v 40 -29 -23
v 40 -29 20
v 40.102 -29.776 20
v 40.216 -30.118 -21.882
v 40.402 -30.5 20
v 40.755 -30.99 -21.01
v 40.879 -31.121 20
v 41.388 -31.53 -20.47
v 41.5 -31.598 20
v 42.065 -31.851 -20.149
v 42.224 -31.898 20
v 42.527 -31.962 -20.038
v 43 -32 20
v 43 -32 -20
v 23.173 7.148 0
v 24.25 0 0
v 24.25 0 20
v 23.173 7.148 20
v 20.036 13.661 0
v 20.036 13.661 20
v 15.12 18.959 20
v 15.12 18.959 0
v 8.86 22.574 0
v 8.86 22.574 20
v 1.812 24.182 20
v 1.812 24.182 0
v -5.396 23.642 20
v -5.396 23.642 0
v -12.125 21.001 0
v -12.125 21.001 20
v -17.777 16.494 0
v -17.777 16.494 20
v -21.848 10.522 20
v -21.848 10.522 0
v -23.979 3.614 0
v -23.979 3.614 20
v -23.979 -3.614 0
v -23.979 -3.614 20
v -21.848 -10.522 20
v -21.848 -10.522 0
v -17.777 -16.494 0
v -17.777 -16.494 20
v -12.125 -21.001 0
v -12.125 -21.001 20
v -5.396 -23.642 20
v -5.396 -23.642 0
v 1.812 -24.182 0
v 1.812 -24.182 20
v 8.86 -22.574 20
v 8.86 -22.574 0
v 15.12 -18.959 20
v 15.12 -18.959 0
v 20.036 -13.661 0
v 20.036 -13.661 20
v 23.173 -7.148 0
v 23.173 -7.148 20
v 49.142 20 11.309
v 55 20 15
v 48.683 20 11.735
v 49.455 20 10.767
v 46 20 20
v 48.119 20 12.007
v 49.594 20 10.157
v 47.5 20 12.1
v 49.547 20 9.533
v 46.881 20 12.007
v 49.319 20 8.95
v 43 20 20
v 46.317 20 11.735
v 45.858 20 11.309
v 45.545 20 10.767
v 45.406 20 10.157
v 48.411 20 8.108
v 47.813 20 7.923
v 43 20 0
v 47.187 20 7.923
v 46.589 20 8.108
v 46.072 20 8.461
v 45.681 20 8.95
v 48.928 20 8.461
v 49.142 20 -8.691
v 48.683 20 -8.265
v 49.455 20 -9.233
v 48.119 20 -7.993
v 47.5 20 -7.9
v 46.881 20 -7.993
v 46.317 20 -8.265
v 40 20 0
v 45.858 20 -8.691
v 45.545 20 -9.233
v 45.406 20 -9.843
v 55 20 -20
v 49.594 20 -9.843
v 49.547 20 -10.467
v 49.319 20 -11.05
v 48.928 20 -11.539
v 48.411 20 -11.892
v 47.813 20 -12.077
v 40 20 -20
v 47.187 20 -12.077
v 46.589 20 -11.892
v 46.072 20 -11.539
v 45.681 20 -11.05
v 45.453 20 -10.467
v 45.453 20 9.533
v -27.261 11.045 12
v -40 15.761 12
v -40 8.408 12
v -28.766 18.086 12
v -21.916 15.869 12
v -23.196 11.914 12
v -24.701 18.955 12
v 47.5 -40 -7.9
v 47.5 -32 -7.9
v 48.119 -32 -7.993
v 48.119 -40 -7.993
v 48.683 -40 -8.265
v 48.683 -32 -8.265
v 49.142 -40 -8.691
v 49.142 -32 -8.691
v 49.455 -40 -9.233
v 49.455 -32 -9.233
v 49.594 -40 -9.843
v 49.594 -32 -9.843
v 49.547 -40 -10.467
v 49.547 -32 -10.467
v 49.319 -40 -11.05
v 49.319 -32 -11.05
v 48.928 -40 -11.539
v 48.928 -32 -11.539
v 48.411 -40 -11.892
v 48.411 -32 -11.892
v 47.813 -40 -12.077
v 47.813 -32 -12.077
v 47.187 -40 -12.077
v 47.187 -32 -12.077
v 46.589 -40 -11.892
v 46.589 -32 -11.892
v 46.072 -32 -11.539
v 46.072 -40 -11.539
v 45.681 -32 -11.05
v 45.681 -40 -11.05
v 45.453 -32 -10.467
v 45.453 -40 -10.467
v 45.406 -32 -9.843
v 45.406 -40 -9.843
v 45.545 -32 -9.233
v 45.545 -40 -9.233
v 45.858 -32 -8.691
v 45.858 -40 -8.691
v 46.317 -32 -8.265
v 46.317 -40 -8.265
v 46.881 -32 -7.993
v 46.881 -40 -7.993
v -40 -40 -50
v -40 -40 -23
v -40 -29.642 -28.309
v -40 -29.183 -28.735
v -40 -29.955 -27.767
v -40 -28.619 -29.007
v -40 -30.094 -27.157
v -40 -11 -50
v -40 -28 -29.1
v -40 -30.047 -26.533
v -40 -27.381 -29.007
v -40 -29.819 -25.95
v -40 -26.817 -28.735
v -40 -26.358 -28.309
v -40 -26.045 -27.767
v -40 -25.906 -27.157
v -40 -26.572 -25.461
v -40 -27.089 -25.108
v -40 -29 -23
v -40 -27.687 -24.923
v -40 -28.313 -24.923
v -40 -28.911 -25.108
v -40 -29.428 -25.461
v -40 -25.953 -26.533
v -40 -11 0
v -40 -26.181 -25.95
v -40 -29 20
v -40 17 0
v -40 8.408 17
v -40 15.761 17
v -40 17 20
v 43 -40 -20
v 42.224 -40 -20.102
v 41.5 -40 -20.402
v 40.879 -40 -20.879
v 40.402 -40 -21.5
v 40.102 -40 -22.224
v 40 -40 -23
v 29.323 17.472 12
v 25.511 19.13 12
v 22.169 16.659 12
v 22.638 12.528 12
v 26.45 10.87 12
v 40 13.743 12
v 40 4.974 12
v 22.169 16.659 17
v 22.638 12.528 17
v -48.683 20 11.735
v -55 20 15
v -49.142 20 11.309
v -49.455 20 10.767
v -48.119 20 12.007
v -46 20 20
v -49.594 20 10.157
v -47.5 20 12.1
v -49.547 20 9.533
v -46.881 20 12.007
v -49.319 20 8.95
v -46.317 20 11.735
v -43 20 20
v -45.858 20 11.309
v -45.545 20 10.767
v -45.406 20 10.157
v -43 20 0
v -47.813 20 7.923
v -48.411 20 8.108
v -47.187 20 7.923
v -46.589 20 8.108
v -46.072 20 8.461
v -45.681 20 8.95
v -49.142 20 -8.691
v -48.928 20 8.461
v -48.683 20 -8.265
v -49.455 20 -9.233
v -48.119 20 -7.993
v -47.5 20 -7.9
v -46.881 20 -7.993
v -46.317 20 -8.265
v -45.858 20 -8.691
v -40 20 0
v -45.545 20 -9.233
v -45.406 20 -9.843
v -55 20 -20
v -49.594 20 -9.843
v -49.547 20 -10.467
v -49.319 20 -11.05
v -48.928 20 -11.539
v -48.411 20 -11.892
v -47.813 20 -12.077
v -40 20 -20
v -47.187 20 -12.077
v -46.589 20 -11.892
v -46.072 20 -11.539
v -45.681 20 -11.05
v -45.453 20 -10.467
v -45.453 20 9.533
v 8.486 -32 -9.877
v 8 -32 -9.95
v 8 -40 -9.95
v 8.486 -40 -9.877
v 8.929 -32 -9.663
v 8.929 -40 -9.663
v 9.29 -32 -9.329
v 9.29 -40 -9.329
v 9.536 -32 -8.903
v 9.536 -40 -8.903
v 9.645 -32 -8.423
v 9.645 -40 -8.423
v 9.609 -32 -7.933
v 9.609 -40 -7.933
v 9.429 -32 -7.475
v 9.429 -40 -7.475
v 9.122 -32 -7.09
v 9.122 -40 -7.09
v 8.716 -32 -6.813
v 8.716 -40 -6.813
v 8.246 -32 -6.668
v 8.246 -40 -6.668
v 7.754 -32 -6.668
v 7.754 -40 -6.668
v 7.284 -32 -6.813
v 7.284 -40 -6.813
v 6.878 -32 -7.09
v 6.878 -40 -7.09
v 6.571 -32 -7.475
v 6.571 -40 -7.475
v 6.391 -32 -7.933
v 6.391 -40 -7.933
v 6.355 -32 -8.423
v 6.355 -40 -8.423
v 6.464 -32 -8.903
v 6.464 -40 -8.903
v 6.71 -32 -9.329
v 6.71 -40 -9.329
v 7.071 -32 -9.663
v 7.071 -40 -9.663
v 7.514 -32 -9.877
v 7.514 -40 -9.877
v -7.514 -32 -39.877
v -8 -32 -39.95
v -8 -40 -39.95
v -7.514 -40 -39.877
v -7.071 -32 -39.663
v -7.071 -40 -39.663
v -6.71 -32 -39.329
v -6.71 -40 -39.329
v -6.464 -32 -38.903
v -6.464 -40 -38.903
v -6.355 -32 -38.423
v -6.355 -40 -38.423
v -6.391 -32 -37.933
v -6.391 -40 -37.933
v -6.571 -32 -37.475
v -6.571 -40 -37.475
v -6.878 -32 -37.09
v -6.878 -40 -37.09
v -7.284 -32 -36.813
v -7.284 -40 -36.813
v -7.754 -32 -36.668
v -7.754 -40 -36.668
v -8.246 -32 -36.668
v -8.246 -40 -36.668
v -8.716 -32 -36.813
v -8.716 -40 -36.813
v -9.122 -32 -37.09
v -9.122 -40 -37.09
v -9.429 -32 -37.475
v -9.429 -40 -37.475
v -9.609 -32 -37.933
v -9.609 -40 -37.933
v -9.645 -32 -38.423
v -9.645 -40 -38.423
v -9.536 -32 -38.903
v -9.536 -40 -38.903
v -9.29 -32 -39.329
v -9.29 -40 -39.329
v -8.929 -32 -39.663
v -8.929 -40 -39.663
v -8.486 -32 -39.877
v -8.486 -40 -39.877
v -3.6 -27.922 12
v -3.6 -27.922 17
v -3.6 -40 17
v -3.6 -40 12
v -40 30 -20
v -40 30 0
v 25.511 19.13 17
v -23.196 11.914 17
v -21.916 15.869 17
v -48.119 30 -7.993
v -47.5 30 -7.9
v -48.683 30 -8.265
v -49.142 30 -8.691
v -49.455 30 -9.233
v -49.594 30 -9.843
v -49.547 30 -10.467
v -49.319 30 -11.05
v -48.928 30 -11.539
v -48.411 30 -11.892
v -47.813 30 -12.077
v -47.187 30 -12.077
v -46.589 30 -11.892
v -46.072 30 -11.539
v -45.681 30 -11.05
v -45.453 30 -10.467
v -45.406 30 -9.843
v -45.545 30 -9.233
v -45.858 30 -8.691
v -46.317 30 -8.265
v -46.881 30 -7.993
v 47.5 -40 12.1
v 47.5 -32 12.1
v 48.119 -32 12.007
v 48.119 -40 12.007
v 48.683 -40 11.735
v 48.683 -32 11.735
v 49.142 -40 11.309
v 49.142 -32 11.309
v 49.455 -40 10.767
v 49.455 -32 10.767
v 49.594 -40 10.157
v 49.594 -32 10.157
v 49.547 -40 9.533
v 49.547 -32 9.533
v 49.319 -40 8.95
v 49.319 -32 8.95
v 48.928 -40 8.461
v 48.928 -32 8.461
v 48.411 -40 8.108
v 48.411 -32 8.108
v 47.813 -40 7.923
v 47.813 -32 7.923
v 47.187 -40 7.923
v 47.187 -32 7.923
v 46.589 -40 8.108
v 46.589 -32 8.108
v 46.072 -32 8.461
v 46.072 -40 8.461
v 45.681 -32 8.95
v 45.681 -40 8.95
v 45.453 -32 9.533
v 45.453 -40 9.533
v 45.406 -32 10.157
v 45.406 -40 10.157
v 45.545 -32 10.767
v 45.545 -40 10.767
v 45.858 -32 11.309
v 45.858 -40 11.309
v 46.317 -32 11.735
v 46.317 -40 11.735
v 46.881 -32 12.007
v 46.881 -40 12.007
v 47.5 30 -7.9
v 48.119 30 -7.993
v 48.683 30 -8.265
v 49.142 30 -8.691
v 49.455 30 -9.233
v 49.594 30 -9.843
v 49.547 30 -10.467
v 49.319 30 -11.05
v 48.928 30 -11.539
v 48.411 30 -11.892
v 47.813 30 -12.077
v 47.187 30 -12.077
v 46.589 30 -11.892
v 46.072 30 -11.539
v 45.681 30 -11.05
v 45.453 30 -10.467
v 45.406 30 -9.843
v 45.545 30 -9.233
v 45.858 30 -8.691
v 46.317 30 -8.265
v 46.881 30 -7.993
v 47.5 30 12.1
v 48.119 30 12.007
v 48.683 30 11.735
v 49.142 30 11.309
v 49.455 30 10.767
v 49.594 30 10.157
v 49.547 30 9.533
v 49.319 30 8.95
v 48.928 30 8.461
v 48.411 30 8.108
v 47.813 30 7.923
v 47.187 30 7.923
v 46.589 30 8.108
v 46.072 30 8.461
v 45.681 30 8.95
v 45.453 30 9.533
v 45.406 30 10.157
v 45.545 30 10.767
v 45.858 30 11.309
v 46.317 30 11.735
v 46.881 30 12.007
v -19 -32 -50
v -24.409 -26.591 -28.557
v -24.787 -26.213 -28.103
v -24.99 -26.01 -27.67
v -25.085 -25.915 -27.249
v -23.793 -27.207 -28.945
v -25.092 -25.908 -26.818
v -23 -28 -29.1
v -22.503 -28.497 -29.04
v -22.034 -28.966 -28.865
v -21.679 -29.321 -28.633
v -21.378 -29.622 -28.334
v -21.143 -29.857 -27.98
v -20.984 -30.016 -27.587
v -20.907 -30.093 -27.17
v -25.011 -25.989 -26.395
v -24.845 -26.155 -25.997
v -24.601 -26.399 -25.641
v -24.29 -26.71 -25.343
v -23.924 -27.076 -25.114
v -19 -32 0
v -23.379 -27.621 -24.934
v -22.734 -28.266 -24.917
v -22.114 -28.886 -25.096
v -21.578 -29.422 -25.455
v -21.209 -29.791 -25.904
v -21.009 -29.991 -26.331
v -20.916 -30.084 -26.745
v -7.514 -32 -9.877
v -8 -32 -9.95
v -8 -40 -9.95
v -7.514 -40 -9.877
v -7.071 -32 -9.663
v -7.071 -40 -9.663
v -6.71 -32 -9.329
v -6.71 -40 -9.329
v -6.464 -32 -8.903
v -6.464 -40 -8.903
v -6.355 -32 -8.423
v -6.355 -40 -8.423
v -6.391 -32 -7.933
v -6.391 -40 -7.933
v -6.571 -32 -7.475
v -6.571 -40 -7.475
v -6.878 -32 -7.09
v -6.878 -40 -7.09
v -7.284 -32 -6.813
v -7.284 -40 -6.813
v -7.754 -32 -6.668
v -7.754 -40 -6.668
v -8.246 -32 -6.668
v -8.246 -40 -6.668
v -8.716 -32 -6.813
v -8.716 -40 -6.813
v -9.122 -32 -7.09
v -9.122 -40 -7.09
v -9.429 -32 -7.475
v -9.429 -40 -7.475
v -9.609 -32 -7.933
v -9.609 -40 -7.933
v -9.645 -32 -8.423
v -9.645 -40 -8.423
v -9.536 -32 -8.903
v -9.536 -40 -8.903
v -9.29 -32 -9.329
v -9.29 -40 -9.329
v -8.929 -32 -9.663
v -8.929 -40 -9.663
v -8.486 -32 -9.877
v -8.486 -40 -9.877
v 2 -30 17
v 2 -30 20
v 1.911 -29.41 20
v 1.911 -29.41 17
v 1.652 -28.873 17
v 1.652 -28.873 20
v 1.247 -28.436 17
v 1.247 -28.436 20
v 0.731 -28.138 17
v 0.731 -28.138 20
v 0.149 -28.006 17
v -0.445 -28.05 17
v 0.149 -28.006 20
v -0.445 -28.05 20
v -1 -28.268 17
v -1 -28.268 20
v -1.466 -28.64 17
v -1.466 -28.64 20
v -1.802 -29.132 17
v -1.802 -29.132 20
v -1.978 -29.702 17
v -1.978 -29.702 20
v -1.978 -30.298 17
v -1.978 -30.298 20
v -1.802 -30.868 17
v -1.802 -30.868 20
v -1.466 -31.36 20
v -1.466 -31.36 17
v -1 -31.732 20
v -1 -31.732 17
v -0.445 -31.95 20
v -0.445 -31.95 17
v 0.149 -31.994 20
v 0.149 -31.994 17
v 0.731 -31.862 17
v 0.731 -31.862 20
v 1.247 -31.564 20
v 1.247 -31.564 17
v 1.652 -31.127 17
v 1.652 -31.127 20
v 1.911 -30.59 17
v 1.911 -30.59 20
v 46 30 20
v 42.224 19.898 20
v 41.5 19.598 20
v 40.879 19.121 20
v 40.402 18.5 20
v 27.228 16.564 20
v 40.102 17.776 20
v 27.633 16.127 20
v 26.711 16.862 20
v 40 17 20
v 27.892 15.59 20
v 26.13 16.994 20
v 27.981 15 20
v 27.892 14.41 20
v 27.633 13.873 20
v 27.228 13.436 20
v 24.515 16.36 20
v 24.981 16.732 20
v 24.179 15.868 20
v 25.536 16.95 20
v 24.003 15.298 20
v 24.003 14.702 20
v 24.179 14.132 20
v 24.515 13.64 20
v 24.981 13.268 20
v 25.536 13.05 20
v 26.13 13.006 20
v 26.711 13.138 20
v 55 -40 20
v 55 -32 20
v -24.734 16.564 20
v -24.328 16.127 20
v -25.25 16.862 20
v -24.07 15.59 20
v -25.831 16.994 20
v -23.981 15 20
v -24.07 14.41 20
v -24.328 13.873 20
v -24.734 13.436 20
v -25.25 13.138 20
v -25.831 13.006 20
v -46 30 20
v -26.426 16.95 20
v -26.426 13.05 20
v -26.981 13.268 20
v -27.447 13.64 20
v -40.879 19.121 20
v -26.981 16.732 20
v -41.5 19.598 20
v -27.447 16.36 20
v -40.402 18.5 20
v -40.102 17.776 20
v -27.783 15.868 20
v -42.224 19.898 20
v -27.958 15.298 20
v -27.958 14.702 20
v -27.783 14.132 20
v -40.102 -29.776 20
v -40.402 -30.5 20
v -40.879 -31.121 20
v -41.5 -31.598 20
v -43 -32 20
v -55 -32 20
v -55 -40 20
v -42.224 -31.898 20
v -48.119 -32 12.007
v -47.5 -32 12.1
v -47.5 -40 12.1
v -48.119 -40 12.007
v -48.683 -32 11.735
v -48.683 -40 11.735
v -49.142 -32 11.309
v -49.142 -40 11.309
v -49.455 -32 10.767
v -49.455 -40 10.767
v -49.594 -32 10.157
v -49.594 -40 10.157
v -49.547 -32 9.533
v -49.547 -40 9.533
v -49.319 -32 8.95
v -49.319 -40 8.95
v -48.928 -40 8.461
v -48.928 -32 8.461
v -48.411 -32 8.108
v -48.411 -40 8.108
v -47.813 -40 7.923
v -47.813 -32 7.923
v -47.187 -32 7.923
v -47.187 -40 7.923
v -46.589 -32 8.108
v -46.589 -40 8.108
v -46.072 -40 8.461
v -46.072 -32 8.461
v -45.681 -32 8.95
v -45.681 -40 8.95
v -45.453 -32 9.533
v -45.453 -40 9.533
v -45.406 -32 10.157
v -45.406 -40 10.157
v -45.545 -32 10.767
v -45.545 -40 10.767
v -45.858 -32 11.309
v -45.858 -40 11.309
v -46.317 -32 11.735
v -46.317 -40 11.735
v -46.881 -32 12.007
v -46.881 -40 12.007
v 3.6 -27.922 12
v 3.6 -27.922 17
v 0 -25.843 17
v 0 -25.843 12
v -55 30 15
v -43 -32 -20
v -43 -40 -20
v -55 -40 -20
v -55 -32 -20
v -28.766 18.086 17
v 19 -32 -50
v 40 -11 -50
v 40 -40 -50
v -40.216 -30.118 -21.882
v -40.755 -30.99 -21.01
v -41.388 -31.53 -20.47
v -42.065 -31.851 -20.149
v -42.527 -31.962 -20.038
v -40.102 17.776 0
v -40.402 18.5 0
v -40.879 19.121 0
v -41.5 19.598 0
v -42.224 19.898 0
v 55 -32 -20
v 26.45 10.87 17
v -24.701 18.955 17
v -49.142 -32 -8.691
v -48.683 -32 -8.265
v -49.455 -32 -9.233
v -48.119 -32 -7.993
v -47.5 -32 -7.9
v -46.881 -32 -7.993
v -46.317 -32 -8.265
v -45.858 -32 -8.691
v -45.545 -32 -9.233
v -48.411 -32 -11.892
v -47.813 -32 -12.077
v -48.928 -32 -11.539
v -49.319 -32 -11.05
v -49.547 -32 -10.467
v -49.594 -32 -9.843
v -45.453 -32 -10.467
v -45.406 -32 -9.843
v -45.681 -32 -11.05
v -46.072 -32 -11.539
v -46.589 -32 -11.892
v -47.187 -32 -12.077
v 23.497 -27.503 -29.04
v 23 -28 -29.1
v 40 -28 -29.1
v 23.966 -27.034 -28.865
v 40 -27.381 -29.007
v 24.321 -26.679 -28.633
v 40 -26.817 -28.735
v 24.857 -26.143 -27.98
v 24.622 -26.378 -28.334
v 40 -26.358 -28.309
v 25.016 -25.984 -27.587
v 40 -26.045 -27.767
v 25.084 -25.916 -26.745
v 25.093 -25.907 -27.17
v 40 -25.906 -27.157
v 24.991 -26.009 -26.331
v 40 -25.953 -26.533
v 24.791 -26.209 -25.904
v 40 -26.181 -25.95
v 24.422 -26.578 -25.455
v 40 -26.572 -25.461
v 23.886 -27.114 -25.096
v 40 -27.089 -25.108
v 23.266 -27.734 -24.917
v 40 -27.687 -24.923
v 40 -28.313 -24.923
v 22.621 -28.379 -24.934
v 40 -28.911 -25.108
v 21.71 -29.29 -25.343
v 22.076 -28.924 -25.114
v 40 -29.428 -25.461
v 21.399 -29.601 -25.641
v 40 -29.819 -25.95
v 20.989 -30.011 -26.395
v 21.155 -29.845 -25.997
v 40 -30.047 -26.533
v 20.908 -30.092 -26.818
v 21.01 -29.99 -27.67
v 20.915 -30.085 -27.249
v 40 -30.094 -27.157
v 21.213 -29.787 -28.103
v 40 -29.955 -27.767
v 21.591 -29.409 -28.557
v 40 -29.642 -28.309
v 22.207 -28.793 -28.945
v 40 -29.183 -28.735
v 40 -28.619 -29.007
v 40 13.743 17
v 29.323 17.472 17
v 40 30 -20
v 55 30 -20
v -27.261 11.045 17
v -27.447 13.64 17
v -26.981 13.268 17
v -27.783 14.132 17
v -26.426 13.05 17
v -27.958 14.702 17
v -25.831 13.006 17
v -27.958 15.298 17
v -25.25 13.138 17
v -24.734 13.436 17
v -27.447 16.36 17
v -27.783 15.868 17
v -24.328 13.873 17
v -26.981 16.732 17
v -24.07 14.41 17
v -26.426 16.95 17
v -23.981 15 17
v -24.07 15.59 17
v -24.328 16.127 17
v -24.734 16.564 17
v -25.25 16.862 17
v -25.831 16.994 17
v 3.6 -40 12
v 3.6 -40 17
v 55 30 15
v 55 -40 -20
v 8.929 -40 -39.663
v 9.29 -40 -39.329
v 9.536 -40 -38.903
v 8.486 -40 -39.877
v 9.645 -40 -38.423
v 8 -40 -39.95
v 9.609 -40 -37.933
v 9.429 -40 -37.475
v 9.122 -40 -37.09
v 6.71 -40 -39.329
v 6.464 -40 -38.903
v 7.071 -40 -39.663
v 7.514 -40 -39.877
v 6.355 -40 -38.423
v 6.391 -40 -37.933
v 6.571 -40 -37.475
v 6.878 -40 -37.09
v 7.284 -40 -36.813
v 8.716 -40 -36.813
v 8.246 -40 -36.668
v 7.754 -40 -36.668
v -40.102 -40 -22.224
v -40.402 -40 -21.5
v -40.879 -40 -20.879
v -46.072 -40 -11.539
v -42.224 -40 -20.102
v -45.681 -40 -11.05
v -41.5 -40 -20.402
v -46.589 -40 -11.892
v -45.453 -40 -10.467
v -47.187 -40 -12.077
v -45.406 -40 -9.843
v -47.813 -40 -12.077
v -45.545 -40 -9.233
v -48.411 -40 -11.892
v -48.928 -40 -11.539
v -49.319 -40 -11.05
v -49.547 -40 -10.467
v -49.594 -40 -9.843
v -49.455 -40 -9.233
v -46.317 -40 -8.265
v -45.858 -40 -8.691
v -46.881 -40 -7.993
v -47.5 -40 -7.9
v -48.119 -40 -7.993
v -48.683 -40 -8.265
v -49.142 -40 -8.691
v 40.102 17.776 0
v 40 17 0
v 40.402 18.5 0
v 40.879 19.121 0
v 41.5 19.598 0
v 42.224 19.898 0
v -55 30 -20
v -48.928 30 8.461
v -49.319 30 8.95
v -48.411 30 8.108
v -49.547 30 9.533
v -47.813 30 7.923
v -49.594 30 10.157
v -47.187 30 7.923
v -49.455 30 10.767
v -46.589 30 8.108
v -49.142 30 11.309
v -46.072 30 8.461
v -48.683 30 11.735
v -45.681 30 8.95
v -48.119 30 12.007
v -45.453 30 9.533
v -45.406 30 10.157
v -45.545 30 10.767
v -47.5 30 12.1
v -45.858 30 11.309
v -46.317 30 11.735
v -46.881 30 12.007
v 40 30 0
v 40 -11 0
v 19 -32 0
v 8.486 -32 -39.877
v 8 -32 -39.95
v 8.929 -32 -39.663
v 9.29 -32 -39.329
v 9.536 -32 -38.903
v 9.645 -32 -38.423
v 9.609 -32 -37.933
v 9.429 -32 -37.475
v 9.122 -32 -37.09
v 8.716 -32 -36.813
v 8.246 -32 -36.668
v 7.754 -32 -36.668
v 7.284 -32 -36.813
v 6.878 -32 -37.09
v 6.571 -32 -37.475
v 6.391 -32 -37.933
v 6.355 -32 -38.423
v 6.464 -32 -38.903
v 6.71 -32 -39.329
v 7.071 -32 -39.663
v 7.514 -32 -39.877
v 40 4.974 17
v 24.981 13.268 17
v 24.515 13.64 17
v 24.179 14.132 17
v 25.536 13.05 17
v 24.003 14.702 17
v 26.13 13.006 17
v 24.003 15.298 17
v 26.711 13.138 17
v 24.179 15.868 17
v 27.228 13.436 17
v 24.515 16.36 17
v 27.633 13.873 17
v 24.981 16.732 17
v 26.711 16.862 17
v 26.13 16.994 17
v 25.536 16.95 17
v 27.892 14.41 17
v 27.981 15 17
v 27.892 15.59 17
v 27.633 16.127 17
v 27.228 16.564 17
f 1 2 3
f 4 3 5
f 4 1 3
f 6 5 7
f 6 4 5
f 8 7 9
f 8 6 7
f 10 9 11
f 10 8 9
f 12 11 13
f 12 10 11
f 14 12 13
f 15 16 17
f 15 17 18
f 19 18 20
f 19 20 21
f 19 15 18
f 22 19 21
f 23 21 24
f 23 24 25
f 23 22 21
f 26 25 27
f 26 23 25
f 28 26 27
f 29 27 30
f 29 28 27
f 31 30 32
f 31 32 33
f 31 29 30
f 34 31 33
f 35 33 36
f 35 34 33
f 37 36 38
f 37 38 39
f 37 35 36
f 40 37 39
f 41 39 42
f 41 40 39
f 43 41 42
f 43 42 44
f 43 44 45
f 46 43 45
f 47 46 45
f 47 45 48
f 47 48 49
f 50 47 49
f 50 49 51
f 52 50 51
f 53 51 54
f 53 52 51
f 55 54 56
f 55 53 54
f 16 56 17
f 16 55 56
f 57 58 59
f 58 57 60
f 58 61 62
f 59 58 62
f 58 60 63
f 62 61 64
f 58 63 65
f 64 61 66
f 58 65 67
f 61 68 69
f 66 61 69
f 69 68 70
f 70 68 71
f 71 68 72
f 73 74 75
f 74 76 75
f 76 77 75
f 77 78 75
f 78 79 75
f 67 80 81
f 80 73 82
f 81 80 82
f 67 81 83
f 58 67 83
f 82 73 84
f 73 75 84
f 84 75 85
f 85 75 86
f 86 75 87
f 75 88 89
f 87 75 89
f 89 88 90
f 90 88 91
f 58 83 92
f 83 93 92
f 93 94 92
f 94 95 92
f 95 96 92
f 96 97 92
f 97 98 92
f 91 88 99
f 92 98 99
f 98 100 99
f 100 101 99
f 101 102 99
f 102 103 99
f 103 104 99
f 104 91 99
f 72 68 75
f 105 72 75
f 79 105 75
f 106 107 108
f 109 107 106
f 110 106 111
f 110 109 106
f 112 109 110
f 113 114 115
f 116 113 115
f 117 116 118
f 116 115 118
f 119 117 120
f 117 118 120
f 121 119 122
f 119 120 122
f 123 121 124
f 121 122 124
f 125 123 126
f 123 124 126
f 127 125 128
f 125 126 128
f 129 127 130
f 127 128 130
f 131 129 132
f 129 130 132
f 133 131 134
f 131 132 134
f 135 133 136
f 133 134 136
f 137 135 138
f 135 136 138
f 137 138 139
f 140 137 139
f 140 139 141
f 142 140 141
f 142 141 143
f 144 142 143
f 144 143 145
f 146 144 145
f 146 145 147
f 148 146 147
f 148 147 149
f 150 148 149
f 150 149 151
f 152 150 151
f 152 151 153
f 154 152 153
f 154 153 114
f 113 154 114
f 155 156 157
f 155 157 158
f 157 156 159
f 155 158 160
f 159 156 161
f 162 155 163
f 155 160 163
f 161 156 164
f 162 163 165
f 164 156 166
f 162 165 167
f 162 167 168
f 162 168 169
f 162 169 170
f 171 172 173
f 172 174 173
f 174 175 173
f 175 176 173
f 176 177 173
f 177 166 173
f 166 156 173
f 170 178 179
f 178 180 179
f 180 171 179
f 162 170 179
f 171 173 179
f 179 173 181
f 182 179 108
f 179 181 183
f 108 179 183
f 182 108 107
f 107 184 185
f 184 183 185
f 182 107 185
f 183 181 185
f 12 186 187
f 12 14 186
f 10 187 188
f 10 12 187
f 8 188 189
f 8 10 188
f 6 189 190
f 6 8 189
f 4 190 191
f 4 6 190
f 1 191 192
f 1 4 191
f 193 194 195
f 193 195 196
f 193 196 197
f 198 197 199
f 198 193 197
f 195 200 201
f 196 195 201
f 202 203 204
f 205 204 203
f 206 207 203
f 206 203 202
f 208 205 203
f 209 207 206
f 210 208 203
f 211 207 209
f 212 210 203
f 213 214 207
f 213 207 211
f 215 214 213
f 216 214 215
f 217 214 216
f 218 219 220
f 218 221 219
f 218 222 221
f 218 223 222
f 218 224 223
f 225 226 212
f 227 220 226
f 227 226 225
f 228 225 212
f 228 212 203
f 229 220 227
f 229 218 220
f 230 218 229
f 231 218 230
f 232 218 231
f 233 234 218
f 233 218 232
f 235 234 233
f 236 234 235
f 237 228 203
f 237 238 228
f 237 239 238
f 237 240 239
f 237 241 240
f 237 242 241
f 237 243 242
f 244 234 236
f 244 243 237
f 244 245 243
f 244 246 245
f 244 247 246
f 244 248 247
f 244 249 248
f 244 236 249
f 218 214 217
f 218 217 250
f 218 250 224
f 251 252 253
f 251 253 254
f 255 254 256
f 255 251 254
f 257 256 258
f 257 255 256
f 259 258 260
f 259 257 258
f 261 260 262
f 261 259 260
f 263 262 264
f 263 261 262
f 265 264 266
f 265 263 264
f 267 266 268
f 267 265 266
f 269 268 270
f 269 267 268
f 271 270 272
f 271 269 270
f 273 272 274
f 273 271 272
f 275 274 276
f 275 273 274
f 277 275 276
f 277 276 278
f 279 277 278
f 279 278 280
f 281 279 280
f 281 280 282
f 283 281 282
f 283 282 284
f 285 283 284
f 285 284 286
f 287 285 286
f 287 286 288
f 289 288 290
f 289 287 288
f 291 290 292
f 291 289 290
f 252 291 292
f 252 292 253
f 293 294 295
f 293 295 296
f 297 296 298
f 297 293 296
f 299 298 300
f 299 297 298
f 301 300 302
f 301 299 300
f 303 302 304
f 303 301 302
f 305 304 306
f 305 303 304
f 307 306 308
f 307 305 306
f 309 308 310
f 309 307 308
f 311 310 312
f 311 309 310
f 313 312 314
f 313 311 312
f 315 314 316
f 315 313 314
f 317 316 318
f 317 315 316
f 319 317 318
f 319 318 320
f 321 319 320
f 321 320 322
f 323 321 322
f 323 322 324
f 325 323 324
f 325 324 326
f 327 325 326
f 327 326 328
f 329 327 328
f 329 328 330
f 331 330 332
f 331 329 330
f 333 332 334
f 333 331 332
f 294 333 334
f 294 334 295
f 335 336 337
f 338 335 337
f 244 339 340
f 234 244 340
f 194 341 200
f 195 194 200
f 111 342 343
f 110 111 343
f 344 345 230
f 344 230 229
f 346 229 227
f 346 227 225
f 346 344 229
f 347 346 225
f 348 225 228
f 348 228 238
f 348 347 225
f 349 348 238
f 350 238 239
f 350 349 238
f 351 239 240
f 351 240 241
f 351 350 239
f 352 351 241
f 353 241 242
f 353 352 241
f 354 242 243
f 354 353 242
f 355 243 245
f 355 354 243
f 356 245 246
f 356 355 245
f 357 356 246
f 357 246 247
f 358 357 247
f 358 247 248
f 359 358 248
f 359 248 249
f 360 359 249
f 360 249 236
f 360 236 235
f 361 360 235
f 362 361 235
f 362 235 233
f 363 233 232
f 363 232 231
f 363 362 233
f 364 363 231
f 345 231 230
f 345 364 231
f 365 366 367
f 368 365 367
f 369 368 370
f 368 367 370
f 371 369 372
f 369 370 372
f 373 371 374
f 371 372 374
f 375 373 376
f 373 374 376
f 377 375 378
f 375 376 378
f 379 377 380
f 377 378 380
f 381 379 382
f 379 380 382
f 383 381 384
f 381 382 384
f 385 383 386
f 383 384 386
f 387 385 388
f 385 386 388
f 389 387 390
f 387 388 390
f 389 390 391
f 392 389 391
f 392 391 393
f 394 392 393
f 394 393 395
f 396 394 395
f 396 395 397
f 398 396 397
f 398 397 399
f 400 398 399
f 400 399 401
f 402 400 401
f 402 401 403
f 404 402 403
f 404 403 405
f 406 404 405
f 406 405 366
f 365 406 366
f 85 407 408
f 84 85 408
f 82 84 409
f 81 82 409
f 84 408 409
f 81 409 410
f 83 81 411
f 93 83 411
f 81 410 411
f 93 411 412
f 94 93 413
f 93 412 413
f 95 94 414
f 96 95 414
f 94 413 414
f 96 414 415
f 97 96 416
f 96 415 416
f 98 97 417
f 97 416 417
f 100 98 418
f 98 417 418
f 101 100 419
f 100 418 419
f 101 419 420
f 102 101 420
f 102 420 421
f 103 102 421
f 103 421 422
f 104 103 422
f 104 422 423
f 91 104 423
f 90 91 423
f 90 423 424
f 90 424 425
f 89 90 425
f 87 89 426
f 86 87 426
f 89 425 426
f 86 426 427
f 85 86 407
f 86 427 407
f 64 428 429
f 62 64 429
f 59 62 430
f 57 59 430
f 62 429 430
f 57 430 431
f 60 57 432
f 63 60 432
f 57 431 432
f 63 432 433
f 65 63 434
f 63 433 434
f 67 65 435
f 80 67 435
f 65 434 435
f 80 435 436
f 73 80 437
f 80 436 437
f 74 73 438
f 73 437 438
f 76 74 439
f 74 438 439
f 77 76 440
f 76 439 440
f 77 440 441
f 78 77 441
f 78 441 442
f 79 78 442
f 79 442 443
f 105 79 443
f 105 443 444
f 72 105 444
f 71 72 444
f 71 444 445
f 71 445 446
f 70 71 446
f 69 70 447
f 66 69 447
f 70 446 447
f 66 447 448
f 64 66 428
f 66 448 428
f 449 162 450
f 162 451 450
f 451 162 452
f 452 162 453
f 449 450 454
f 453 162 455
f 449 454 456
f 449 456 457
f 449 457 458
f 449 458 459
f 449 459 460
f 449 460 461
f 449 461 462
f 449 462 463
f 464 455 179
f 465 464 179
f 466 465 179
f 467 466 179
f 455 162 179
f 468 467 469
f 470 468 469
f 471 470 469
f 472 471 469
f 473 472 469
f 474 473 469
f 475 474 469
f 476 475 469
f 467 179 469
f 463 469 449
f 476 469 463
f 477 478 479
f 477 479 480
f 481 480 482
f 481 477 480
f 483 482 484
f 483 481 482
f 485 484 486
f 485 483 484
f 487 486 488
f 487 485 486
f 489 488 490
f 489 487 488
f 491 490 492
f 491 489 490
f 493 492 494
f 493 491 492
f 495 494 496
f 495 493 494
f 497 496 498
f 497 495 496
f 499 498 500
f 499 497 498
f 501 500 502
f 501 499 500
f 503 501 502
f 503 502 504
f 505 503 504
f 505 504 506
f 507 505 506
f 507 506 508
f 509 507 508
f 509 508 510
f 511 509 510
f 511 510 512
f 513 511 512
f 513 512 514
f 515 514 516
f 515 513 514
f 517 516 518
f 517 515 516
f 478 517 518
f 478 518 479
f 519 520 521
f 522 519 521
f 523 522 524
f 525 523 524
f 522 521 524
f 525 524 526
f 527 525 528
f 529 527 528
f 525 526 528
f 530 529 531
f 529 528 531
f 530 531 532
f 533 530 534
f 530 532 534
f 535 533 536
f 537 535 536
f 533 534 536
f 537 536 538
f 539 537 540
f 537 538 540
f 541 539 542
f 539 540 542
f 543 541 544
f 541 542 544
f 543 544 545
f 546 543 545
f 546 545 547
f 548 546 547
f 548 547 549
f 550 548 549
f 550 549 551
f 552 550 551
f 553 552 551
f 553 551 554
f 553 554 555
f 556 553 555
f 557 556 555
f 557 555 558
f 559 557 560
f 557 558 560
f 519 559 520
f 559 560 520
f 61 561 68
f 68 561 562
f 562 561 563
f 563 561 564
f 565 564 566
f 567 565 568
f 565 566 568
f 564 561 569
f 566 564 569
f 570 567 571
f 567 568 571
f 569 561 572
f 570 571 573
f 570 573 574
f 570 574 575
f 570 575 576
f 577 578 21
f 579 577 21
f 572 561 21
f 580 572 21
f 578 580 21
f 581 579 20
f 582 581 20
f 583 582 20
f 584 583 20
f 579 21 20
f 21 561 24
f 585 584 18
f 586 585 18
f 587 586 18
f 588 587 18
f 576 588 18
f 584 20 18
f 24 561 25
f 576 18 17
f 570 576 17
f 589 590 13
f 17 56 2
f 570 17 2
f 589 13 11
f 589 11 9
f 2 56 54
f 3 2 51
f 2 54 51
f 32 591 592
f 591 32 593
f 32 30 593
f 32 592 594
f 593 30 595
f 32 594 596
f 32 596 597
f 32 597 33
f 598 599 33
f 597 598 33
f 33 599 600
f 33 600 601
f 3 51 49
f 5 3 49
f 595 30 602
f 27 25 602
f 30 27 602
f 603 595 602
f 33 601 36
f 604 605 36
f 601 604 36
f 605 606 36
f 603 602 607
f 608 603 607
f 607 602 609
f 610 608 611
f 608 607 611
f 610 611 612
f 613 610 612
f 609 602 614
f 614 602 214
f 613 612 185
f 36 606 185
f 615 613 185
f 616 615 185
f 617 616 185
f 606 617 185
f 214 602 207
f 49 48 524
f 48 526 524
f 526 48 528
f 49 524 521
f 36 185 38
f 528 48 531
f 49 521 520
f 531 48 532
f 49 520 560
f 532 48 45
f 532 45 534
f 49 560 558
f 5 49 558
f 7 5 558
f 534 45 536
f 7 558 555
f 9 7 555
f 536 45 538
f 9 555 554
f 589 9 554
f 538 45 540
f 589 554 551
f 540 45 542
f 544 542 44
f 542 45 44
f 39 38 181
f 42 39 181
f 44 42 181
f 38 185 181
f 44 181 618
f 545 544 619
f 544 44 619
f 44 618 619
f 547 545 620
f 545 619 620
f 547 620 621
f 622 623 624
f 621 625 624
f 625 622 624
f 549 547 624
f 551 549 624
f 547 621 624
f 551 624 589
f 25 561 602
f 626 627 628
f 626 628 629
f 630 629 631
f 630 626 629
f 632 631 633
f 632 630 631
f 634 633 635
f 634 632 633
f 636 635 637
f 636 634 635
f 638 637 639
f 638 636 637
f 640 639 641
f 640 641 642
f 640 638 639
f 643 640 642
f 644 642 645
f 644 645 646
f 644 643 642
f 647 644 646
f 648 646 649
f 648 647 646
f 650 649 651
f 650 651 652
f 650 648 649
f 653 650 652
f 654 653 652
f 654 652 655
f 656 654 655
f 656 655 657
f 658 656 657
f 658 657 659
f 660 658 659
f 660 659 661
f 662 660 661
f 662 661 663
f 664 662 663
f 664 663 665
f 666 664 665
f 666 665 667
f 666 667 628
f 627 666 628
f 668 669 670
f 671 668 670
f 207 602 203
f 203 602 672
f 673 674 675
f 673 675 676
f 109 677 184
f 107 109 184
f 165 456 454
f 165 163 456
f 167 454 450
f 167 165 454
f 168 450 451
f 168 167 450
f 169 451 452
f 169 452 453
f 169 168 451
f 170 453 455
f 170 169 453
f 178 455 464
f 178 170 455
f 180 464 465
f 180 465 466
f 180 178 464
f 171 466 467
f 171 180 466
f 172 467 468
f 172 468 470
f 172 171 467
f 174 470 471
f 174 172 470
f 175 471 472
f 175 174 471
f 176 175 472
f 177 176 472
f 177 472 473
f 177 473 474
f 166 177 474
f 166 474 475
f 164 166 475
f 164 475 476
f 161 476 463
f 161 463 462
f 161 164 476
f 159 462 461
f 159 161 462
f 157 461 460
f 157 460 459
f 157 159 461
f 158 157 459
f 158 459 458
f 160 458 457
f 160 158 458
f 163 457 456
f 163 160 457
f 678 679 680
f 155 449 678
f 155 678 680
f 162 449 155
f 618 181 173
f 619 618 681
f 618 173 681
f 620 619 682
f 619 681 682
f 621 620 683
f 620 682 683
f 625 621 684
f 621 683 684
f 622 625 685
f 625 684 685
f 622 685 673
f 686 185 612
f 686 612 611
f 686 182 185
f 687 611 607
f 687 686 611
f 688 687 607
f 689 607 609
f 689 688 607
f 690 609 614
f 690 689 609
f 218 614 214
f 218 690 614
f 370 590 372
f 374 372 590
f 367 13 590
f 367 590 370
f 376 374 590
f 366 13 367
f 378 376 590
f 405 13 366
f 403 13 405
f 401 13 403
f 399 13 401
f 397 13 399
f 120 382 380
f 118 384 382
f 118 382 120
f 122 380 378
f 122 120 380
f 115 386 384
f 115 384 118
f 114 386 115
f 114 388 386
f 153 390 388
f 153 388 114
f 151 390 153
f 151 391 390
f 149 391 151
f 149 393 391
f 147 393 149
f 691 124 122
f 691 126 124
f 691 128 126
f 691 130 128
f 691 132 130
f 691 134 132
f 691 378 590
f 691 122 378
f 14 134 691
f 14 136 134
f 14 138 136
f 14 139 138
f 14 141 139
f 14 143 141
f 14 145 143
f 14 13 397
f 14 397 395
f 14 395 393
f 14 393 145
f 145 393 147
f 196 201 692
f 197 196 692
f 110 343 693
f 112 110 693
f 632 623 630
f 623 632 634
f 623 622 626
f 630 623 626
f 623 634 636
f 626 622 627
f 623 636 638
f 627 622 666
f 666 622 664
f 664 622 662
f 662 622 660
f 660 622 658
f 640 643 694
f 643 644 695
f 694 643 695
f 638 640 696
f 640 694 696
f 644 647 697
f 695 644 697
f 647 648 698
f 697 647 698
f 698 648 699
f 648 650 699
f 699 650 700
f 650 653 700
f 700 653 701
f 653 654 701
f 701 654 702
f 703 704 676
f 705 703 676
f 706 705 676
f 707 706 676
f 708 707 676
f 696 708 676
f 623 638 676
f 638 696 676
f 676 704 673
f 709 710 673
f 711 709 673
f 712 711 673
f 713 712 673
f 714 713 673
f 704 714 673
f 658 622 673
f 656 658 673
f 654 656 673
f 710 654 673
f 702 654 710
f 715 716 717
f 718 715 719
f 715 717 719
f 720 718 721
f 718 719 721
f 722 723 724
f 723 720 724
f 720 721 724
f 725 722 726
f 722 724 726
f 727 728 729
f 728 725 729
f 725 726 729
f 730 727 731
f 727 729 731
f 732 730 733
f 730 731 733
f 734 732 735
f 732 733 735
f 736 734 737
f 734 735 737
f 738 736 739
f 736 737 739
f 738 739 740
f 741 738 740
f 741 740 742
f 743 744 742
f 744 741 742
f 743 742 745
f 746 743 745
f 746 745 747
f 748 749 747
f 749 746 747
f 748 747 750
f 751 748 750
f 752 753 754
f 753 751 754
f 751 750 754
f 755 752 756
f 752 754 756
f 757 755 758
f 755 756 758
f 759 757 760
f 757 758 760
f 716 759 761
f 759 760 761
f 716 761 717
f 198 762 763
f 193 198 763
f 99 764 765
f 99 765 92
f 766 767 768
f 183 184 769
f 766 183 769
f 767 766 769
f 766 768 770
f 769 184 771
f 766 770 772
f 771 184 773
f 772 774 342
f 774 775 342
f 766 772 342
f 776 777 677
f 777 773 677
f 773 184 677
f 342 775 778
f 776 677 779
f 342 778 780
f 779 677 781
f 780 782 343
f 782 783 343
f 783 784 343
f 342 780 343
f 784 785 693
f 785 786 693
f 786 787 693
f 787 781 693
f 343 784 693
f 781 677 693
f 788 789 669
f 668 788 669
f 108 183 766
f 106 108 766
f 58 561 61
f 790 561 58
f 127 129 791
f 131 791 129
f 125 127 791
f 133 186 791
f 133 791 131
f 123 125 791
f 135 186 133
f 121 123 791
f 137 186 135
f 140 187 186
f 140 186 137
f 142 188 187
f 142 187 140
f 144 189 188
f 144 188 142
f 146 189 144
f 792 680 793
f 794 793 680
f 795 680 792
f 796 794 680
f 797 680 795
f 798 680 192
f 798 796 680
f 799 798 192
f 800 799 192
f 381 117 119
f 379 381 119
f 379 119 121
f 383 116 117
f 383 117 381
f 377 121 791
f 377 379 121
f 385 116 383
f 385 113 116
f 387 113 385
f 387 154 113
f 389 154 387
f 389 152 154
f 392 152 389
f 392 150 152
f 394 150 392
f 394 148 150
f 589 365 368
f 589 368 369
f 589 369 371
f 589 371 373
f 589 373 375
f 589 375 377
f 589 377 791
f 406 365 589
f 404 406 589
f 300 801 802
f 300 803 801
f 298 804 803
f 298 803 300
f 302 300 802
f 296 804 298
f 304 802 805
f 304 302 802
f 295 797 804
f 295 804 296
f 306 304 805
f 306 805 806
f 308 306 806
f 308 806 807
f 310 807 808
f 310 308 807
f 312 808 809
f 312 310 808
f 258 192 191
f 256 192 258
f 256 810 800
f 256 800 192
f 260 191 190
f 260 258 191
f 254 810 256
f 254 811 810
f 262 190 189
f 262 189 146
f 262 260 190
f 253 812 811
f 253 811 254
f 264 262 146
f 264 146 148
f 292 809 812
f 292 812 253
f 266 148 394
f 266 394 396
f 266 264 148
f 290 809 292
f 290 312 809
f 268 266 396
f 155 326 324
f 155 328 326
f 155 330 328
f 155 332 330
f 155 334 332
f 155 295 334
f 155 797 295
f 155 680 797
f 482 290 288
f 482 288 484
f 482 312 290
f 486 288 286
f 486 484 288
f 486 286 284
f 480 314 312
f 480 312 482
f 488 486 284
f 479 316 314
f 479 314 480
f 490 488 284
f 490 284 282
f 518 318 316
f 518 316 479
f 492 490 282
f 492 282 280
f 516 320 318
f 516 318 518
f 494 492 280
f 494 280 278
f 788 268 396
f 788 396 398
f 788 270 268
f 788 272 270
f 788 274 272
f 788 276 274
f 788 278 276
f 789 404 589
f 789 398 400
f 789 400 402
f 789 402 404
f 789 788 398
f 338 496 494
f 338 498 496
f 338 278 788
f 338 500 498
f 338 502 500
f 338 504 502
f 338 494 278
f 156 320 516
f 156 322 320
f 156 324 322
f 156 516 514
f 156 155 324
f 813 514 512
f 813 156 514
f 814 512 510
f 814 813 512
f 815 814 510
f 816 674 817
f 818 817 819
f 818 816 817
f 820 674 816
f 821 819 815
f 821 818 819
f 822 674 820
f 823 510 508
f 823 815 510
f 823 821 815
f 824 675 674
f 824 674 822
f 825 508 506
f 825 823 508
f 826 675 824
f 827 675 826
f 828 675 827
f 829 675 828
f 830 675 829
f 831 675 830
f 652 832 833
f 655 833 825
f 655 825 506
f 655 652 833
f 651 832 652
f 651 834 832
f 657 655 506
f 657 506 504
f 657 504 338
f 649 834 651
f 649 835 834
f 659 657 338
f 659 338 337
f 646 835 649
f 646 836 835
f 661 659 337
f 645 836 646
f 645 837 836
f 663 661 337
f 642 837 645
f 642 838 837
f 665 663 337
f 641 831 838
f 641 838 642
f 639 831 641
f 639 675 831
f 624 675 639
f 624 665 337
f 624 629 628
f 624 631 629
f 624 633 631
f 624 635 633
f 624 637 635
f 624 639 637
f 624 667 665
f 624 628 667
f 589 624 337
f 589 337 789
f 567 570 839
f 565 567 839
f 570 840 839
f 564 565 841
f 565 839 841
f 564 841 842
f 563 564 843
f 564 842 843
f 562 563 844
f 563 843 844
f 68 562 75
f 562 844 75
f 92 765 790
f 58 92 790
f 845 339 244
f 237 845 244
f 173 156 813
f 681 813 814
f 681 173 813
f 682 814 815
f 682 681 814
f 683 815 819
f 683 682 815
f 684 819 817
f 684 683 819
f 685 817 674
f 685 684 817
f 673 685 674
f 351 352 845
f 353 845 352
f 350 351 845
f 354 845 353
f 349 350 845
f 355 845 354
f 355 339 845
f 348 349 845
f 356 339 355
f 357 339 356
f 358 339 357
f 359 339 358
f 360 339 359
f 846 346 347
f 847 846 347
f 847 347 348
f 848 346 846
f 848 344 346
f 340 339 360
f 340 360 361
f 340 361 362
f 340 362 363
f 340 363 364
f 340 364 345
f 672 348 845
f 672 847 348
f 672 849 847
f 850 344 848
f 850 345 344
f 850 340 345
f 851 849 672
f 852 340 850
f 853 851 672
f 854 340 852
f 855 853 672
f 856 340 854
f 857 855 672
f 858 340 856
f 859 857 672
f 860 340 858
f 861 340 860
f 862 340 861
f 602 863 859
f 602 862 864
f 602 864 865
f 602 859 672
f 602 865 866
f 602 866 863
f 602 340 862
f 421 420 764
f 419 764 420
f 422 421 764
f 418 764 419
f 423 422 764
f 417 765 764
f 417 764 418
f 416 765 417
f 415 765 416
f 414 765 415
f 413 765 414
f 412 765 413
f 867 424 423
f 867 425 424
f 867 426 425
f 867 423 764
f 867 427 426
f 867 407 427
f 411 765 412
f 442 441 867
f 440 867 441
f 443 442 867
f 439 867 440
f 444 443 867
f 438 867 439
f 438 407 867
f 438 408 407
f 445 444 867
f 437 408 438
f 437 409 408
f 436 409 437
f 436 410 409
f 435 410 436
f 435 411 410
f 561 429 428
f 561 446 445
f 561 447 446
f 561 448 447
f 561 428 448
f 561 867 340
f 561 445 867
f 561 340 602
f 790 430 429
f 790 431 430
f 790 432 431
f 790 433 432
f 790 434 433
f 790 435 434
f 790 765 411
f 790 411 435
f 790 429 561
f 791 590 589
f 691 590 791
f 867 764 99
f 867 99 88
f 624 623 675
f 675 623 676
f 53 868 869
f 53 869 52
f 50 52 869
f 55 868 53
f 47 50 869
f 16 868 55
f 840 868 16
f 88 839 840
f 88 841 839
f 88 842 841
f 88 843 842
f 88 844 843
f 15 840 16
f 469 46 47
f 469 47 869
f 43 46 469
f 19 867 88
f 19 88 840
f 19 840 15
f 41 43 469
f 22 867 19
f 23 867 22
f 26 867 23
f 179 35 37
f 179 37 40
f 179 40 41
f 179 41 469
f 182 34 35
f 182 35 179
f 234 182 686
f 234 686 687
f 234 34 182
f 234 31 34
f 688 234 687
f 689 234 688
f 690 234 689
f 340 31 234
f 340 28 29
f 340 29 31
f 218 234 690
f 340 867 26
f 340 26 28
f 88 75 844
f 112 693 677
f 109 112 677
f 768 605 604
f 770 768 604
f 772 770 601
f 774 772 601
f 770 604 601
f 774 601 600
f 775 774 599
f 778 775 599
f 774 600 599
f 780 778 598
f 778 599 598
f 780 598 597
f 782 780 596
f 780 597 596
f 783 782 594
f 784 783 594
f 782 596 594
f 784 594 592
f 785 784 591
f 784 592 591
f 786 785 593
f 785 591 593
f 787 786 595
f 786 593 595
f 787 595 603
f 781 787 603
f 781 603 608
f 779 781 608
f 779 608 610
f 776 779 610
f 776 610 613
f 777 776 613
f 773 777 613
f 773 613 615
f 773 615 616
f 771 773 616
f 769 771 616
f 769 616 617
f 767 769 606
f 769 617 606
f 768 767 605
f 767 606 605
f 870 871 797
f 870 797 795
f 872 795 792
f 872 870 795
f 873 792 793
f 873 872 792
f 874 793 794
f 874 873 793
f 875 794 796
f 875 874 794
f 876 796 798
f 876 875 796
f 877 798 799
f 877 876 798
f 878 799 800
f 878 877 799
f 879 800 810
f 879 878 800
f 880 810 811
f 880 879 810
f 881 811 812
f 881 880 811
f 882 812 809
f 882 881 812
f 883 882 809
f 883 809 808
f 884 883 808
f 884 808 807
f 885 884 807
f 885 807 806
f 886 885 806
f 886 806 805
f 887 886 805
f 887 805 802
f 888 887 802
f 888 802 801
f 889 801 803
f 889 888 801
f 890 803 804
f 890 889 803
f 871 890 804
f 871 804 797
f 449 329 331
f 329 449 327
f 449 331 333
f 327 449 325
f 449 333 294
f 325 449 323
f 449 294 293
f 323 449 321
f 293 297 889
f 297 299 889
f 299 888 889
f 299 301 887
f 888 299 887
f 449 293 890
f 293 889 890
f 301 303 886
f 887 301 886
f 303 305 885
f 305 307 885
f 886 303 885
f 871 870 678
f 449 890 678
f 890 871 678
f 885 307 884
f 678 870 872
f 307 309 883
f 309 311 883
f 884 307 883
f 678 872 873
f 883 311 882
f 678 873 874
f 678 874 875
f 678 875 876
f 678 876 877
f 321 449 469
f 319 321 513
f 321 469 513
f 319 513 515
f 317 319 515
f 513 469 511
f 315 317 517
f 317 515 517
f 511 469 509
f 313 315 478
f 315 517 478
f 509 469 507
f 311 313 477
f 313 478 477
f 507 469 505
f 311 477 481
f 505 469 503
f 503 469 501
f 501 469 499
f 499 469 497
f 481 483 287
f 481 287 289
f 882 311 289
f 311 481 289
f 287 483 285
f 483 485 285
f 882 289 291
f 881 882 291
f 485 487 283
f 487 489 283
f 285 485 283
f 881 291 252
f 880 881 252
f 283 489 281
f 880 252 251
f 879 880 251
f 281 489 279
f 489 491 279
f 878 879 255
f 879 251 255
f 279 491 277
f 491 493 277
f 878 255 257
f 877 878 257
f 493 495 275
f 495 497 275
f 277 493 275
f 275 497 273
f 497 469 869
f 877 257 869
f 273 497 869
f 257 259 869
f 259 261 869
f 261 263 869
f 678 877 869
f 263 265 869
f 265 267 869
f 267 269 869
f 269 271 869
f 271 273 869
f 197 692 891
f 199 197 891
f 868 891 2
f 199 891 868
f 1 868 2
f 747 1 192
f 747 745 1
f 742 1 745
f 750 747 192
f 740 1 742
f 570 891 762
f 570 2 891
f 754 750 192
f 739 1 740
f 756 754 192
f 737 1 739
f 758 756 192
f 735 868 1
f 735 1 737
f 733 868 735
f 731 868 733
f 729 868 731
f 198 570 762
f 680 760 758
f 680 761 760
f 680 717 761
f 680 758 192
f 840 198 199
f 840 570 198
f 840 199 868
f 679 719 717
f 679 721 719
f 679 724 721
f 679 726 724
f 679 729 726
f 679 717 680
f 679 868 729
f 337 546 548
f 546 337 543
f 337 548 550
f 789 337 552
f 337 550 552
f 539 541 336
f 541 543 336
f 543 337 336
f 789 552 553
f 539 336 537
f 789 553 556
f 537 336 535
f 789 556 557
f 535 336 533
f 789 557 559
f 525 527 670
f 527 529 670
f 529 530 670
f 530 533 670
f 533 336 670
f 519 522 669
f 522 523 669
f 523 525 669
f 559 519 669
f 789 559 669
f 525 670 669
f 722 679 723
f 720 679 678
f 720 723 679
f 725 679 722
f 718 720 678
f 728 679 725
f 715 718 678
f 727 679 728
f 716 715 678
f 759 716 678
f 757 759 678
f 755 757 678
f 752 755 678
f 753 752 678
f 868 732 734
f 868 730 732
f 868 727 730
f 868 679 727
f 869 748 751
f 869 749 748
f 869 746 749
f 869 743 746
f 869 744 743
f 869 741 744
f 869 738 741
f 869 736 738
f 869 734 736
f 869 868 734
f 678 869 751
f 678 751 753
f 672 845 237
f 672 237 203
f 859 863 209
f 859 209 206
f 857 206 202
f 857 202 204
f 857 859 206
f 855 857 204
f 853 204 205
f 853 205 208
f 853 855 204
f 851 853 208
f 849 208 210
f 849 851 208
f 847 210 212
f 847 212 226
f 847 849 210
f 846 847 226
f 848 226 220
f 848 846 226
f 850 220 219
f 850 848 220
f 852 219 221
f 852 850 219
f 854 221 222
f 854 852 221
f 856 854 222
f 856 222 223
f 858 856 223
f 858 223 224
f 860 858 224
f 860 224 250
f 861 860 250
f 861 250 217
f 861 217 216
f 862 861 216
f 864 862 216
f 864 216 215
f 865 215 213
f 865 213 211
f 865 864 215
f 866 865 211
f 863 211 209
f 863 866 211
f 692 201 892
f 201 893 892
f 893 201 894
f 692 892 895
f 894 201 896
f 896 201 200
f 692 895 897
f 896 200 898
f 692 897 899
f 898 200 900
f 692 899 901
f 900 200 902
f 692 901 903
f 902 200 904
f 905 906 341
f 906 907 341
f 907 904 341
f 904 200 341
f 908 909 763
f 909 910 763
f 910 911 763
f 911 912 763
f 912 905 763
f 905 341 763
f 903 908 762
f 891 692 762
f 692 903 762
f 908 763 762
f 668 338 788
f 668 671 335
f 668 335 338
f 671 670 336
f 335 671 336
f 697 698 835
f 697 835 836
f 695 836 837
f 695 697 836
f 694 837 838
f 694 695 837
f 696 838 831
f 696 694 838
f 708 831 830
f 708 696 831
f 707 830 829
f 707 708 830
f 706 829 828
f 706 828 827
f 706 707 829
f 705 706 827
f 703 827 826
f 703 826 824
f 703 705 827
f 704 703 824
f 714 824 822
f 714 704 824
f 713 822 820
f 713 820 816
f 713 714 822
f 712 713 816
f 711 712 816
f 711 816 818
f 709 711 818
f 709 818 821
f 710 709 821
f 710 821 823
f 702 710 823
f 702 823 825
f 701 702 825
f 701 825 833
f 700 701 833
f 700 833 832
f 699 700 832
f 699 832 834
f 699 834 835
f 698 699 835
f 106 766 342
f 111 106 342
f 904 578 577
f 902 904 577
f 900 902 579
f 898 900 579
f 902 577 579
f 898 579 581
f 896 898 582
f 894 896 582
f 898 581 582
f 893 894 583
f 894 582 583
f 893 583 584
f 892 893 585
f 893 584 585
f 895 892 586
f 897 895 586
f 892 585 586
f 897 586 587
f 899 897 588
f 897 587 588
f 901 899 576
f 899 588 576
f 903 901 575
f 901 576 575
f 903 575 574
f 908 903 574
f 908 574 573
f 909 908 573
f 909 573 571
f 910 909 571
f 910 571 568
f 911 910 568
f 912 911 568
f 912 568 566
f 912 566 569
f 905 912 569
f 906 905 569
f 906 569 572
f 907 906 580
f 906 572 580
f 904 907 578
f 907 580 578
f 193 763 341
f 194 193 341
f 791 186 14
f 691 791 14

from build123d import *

# Parameters (mm, degrees)
SKETCH1_W           = 80
SKETCH1_H           = 60
SKETCH1_R           = 24.25
BOSS_EXTRUDE1_DEPTH = 20
BOSS_EXTRUDE3_DEPTH = 15
SKETCH5_R           = 2.1
CUT_EXTRUDE2_DEPTH  = 10
SKETCH6_W           = 80
SKETCH6_H           = 20
BOSS_EXTRUDE4_DEPTH = 2
BOSS_EXTRUDE6_DEPTH = 50
SKETCH9_R           = 2.1
CUT_EXTRUDE3_DEPTH  = 100.619275243
SKETCH12_W          = 80
SKETCH12_H          = 70
SKETCH12_R          = 1.65
BOSS_EXTRUDE8_DEPTH = 8
BOSS_EXTRUDE9_DEPTH = 15
CUT_EXTRUDE4_START  = -10
SKETCH14_R          = 2.1
CUT_EXTRUDE4_DEPTH  = 10
SKETCH16_R          = 2
CUT_EXTRUDE5_DEPTH  = 3
CIRPATTERN1_COUNT   = 3
FILLET1_R           = 3
CUT_EXTRUDE6_DEPTH  = 5


with BuildPart() as part:
    # Sketch1 → Boss-Extrude1 (new body)
    with BuildSketch(Plane.XY):
        Rectangle(SKETCH1_W, SKETCH1_H)
        Circle(SKETCH1_R, mode=Mode.SUBTRACT)
    extrude(amount=BOSS_EXTRUDE1_DEPTH)

    # Sketch4 → Boss-Extrude3 (add)
    with BuildSketch(Plane(origin=(40, 0, 0), x_dir=(0, 0, -1), z_dir=(1, 0, 0))):
        Polygon((-20, 30), (0, 30), (20, 30), (20, 20), (0, 20), (-20, 20), align=None)
    boss_extrude3 = extrude(amount=BOSS_EXTRUDE3_DEPTH)

    # Sketch5 → Cut-Extrude2 (cut)
    with BuildSketch(Plane(origin=(0, 30, 0), x_dir=(1, 0, 0), z_dir=(0, 1, 0))):
        with Locations(Location((47.5, -10, 0), (0, 0, 270))):
            Circle(SKETCH5_R)
        with Locations(Location((47.5, 10, 0), (0, 0, 270))):
            Circle(SKETCH5_R)
        Polygon((46, -20), (55, -15), (55, -20), align=None)
    cut_extrude2 = extrude(amount=-CUT_EXTRUDE2_DEPTH, mode=Mode.SUBTRACT)

    # Sketch6 → Boss-Extrude4 (add)
    with BuildSketch(Plane(origin=(0, -30, 0), x_dir=(-1, 0, 0), z_dir=(0, -1, 0))):
        with Locations((0, -10)):
            Rectangle(SKETCH6_W, SKETCH6_H)
    boss_extrude4 = extrude(amount=BOSS_EXTRUDE4_DEPTH)

    # Sketch8 → Boss-Extrude6 (add)
    with BuildSketch(Plane(origin=(0, 0, 0), x_dir=(-1, 0, 0), z_dir=(0, 0, -1))):
        Polygon((-40, -11), (-19, -32), (-40, -32), align=None)
    boss_extrude6 = extrude(amount=BOSS_EXTRUDE6_DEPTH)

    # Sketch9 → Cut-Extrude3 (cut, through all)
    with BuildSketch(Plane(origin=(40, 0, 0), x_dir=(0, 0, -1), z_dir=(1, 0, 0))):
        with Locations((27, -28)):
            Circle(SKETCH9_R)
    cut_extrude3 = extrude(amount=-CUT_EXTRUDE3_DEPTH, mode=Mode.SUBTRACT)

    # Sketch12 → Boss-Extrude8 (add)
    with BuildSketch(Plane.XZ.offset(32)):
        with Locations((0, -15)):
            Rectangle(SKETCH12_W, SKETCH12_H)
        with Locations(Location((-8, -8.3, 0), (0, 0, 270))):
            Circle(SKETCH12_R, mode=Mode.SUBTRACT)
        with Locations(Location((8, -8.3, 0), (0, 0, 270))):
            Circle(SKETCH12_R, mode=Mode.SUBTRACT)
        with Locations(Location((8, -38.3, 0), (0, 0, 270))):
            Circle(SKETCH12_R, mode=Mode.SUBTRACT)
        with Locations(Location((-8, -38.3, 0), (0, 0, 270))):
            Circle(SKETCH12_R, mode=Mode.SUBTRACT)
    extrude(amount=BOSS_EXTRUDE8_DEPTH)

    # Mirror1: Boss-Extrude3, Cut-Extrude2, Boss-Extrude4, Boss-Extrude6, Cut-Extrude3 across plane
    add(boss_extrude3.mirror(Plane(origin=(0, 0, 0), x_dir=(0, 0, 1), z_dir=(1, 0, 0))))
    add(cut_extrude2.mirror(Plane(origin=(0, 0, 0), x_dir=(0, 0, 1), z_dir=(1, 0, 0))), mode=Mode.SUBTRACT)
    add(boss_extrude4.mirror(Plane(origin=(0, 0, 0), x_dir=(0, 0, 1), z_dir=(1, 0, 0))))
    add(boss_extrude6.mirror(Plane(origin=(0, 0, 0), x_dir=(0, 0, 1), z_dir=(1, 0, 0))))
    add(cut_extrude3.mirror(Plane(origin=(0, 0, 0), x_dir=(0, 0, 1), z_dir=(1, 0, 0))), mode=Mode.SUBTRACT)

    # Sketch13 → Boss-Extrude9 (add)
    with BuildSketch(Plane.ZY.offset(40)):
        Polygon((20, -40), (0, -40), (-20, -40), (-20, -32), (0, -32), (20, -32), align=None)
    boss_extrude9 = extrude(amount=BOSS_EXTRUDE9_DEPTH)

    # Sketch14 → Cut-Extrude4 (cut)
    with BuildSketch(Plane.XZ.offset(40).offset(CUT_EXTRUDE4_START)):
        with Locations(Location((-47.5, 10, 0), (0, 0, 90))):
            Circle(SKETCH14_R)
        with Locations(Location((-47.5, -10, 0), (0, 0, 90))):
            Circle(SKETCH14_R)
    cut_extrude4 = extrude(amount=CUT_EXTRUDE4_DEPTH, mode=Mode.SUBTRACT)

    # Mirror2: Boss-Extrude9, Cut-Extrude4 across plane
    add(boss_extrude9.mirror(Plane(origin=(0, 0, 0), x_dir=(0, 0, 1), z_dir=(1, 0, 0))))
    add(cut_extrude4.mirror(Plane(origin=(0, 0, 0), x_dir=(0, 0, 1), z_dir=(1, 0, 0))), mode=Mode.SUBTRACT)

    # Sketch16 → Cut-Extrude5 (cut)
    with BuildSketch(Plane.XY.offset(20)):
        with Locations((0, -30)):
            Circle(SKETCH16_R)
    cut_extrude5 = extrude(amount=-CUT_EXTRUDE5_DEPTH, mode=Mode.SUBTRACT)

    # CirPattern1: Cut-Extrude5 ×3 about axis
    cirpattern1_axis = Axis((0, 0, 0), (0, 0, 1))
    for i in range(1, CIRPATTERN1_COUNT):
        add(cut_extrude5.rotate(cirpattern1_axis, i * 360 / CIRPATTERN1_COUNT), mode=Mode.SUBTRACT)

    # Fillet1
    fillet1_edges = [part.edges().sort_by_distance(p)[0] for p in [
        (-40, 20, 10),
        (-40, -32, 0),
        (-40, -36, -20),
        (40, 20, 10),
        (40, -32, 0),
        (40, -36, -20),
    ]]
    fillet(fillet1_edges, radius=FILLET1_R)

    # Sketch17 → Cut-Extrude6 (cut)
    with BuildSketch(Plane.XY.offset(17)):
        Polygon((-3.6, -32.078460969), (-3.6, -40), (3.6, -40), (3.6, -32.078460969), (3.6, -27.921539031), (0, -25.843078062), (-3.6, -27.921539031), align=None)
        Polygon((29.323026539, 17.47169345), (25.511345008, 19.130332624), (22.169080583, 16.658639174), (22.638497688, 12.52830655), (26.450179219, 10.869667376), (42.459549451, 3.903248909), (45.851836141, 11.698986963), align=None)
        Polygon((-21.915647081, 15.868815152), (-24.70062059, 18.954900464), (-28.765735623, 18.086085312), (-43.679312497, 14.998912364), (-42.219854604, 7.948533961), (-27.260903637, 11.045099536), (-23.195788604, 11.913914688), align=None)
    extrude(amount=-CUT_EXTRUDE6_DEPTH, mode=Mode.SUBTRACT)


solid = part.part
